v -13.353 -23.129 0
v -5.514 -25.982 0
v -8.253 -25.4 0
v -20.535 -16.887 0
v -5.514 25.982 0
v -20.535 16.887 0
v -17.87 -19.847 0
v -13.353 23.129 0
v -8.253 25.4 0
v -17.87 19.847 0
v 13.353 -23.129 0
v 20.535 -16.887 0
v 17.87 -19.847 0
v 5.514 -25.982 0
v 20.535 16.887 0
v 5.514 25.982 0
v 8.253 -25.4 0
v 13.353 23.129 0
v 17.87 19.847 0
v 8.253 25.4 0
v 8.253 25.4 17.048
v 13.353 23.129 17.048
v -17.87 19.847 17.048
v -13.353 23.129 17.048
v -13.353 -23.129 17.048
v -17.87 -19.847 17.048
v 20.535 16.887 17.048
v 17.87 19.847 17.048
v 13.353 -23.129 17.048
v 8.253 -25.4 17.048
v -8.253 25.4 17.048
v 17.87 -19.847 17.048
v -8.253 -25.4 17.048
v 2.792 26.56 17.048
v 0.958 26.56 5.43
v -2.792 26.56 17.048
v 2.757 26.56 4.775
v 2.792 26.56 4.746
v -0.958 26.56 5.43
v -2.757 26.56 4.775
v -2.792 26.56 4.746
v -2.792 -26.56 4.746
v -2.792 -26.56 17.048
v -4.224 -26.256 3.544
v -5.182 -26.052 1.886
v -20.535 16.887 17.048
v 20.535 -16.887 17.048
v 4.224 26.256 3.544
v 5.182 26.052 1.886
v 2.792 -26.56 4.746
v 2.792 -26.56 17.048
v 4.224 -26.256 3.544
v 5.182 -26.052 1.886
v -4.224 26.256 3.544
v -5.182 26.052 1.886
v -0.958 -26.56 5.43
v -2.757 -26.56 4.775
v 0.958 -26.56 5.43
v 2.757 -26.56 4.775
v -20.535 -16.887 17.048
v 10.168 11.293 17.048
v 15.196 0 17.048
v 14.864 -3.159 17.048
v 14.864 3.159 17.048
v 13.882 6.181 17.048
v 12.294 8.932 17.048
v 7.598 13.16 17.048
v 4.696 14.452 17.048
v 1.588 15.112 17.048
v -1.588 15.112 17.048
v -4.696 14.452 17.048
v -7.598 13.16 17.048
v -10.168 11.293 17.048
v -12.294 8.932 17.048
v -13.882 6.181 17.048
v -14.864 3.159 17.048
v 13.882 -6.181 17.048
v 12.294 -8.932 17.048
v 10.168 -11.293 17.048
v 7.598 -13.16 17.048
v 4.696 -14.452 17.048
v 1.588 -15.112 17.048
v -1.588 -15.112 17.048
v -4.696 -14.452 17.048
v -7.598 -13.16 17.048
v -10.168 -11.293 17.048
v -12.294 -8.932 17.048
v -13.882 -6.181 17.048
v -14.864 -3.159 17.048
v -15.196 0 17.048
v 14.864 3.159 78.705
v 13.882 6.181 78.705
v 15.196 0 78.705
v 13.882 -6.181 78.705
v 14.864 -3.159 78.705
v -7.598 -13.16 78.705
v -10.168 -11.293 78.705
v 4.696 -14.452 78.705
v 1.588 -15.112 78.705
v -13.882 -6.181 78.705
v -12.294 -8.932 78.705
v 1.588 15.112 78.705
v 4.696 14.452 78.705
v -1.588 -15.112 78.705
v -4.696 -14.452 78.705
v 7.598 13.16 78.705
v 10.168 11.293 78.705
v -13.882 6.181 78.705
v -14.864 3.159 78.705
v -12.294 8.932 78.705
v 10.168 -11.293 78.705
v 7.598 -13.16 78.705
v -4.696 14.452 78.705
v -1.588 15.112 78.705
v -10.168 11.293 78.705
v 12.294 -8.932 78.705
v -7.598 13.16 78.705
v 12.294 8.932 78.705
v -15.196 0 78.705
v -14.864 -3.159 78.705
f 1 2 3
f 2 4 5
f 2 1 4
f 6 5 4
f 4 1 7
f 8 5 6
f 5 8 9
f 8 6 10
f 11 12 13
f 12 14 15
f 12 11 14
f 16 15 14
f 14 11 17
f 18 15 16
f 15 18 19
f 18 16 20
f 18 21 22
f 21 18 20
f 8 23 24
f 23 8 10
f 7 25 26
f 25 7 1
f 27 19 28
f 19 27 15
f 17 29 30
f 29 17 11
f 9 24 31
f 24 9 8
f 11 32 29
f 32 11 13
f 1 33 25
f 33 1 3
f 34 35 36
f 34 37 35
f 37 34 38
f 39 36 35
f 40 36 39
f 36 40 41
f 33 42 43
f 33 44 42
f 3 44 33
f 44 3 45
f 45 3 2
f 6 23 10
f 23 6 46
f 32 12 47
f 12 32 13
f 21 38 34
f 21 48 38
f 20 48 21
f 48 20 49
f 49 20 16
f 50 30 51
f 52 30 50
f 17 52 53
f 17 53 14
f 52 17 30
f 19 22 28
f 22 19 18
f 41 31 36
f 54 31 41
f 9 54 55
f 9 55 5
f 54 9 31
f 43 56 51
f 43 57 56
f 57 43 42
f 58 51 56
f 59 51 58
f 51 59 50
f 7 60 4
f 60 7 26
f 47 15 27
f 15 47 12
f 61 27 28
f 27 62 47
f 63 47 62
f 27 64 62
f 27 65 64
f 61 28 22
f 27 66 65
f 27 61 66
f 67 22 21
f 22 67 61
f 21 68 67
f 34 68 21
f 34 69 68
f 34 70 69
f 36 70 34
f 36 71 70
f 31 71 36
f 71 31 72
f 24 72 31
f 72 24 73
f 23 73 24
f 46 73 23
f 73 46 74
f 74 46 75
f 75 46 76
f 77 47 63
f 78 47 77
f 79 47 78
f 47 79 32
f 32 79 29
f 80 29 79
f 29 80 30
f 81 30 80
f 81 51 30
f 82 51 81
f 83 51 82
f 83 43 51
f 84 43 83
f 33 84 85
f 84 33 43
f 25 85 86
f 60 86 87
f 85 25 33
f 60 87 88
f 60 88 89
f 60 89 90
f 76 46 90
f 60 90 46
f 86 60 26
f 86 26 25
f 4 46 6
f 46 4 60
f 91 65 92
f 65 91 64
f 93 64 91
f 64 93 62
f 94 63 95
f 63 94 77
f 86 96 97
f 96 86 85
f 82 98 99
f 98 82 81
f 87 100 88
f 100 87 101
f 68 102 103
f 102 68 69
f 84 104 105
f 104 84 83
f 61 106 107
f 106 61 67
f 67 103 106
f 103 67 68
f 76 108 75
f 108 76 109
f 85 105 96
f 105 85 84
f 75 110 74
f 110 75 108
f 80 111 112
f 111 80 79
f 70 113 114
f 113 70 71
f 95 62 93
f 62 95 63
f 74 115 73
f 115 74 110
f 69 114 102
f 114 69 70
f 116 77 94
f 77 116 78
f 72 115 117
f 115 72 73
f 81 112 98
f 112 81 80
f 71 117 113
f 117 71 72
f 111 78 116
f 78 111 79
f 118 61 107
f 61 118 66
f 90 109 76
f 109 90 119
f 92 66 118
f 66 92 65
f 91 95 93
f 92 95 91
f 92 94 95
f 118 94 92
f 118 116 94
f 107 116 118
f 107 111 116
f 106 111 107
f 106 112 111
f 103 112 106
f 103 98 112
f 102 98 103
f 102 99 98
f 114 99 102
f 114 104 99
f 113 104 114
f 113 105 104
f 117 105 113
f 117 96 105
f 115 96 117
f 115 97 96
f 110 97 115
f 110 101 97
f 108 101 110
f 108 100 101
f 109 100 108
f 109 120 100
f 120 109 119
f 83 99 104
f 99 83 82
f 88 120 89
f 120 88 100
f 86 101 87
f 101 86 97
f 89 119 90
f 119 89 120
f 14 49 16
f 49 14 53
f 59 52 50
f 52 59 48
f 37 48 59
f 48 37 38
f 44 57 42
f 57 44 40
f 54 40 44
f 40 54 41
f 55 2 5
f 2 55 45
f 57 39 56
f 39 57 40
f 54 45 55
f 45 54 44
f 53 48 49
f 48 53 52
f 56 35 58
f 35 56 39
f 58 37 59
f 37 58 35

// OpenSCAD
seed = 18;
seeds = rands(0,1000000,10,seed);
head_size = rands(25,50,1,seeds[1])[0];
head_radius = rands(25,50,1,seeds[2])[0];
bolt_length = rands(head_size*2,200,1,seeds[3])[0];
bolt_radius = rands(head_size/3, head_size/2,1,seeds[0])[0];
cube_size = rands(bolt_radius*2, head_radius*1.6,1, seeds[4])[0];
hole_size = rands(cube_size/10, cube_size/7,1,seeds[5])[0];

difference(){
    union(){
        intersection(){
            cylinder(head_size,head_radius,head_radius);
            cube([cube_size,head_radius*2,head_size], center=true);
        }
        cylinder(bolt_length,bolt_radius,bolt_radius);
    }
    rotate([90, 0, 0]){
        cylinder(head_radius*2,hole_size,hole_size, true);
    }
}
